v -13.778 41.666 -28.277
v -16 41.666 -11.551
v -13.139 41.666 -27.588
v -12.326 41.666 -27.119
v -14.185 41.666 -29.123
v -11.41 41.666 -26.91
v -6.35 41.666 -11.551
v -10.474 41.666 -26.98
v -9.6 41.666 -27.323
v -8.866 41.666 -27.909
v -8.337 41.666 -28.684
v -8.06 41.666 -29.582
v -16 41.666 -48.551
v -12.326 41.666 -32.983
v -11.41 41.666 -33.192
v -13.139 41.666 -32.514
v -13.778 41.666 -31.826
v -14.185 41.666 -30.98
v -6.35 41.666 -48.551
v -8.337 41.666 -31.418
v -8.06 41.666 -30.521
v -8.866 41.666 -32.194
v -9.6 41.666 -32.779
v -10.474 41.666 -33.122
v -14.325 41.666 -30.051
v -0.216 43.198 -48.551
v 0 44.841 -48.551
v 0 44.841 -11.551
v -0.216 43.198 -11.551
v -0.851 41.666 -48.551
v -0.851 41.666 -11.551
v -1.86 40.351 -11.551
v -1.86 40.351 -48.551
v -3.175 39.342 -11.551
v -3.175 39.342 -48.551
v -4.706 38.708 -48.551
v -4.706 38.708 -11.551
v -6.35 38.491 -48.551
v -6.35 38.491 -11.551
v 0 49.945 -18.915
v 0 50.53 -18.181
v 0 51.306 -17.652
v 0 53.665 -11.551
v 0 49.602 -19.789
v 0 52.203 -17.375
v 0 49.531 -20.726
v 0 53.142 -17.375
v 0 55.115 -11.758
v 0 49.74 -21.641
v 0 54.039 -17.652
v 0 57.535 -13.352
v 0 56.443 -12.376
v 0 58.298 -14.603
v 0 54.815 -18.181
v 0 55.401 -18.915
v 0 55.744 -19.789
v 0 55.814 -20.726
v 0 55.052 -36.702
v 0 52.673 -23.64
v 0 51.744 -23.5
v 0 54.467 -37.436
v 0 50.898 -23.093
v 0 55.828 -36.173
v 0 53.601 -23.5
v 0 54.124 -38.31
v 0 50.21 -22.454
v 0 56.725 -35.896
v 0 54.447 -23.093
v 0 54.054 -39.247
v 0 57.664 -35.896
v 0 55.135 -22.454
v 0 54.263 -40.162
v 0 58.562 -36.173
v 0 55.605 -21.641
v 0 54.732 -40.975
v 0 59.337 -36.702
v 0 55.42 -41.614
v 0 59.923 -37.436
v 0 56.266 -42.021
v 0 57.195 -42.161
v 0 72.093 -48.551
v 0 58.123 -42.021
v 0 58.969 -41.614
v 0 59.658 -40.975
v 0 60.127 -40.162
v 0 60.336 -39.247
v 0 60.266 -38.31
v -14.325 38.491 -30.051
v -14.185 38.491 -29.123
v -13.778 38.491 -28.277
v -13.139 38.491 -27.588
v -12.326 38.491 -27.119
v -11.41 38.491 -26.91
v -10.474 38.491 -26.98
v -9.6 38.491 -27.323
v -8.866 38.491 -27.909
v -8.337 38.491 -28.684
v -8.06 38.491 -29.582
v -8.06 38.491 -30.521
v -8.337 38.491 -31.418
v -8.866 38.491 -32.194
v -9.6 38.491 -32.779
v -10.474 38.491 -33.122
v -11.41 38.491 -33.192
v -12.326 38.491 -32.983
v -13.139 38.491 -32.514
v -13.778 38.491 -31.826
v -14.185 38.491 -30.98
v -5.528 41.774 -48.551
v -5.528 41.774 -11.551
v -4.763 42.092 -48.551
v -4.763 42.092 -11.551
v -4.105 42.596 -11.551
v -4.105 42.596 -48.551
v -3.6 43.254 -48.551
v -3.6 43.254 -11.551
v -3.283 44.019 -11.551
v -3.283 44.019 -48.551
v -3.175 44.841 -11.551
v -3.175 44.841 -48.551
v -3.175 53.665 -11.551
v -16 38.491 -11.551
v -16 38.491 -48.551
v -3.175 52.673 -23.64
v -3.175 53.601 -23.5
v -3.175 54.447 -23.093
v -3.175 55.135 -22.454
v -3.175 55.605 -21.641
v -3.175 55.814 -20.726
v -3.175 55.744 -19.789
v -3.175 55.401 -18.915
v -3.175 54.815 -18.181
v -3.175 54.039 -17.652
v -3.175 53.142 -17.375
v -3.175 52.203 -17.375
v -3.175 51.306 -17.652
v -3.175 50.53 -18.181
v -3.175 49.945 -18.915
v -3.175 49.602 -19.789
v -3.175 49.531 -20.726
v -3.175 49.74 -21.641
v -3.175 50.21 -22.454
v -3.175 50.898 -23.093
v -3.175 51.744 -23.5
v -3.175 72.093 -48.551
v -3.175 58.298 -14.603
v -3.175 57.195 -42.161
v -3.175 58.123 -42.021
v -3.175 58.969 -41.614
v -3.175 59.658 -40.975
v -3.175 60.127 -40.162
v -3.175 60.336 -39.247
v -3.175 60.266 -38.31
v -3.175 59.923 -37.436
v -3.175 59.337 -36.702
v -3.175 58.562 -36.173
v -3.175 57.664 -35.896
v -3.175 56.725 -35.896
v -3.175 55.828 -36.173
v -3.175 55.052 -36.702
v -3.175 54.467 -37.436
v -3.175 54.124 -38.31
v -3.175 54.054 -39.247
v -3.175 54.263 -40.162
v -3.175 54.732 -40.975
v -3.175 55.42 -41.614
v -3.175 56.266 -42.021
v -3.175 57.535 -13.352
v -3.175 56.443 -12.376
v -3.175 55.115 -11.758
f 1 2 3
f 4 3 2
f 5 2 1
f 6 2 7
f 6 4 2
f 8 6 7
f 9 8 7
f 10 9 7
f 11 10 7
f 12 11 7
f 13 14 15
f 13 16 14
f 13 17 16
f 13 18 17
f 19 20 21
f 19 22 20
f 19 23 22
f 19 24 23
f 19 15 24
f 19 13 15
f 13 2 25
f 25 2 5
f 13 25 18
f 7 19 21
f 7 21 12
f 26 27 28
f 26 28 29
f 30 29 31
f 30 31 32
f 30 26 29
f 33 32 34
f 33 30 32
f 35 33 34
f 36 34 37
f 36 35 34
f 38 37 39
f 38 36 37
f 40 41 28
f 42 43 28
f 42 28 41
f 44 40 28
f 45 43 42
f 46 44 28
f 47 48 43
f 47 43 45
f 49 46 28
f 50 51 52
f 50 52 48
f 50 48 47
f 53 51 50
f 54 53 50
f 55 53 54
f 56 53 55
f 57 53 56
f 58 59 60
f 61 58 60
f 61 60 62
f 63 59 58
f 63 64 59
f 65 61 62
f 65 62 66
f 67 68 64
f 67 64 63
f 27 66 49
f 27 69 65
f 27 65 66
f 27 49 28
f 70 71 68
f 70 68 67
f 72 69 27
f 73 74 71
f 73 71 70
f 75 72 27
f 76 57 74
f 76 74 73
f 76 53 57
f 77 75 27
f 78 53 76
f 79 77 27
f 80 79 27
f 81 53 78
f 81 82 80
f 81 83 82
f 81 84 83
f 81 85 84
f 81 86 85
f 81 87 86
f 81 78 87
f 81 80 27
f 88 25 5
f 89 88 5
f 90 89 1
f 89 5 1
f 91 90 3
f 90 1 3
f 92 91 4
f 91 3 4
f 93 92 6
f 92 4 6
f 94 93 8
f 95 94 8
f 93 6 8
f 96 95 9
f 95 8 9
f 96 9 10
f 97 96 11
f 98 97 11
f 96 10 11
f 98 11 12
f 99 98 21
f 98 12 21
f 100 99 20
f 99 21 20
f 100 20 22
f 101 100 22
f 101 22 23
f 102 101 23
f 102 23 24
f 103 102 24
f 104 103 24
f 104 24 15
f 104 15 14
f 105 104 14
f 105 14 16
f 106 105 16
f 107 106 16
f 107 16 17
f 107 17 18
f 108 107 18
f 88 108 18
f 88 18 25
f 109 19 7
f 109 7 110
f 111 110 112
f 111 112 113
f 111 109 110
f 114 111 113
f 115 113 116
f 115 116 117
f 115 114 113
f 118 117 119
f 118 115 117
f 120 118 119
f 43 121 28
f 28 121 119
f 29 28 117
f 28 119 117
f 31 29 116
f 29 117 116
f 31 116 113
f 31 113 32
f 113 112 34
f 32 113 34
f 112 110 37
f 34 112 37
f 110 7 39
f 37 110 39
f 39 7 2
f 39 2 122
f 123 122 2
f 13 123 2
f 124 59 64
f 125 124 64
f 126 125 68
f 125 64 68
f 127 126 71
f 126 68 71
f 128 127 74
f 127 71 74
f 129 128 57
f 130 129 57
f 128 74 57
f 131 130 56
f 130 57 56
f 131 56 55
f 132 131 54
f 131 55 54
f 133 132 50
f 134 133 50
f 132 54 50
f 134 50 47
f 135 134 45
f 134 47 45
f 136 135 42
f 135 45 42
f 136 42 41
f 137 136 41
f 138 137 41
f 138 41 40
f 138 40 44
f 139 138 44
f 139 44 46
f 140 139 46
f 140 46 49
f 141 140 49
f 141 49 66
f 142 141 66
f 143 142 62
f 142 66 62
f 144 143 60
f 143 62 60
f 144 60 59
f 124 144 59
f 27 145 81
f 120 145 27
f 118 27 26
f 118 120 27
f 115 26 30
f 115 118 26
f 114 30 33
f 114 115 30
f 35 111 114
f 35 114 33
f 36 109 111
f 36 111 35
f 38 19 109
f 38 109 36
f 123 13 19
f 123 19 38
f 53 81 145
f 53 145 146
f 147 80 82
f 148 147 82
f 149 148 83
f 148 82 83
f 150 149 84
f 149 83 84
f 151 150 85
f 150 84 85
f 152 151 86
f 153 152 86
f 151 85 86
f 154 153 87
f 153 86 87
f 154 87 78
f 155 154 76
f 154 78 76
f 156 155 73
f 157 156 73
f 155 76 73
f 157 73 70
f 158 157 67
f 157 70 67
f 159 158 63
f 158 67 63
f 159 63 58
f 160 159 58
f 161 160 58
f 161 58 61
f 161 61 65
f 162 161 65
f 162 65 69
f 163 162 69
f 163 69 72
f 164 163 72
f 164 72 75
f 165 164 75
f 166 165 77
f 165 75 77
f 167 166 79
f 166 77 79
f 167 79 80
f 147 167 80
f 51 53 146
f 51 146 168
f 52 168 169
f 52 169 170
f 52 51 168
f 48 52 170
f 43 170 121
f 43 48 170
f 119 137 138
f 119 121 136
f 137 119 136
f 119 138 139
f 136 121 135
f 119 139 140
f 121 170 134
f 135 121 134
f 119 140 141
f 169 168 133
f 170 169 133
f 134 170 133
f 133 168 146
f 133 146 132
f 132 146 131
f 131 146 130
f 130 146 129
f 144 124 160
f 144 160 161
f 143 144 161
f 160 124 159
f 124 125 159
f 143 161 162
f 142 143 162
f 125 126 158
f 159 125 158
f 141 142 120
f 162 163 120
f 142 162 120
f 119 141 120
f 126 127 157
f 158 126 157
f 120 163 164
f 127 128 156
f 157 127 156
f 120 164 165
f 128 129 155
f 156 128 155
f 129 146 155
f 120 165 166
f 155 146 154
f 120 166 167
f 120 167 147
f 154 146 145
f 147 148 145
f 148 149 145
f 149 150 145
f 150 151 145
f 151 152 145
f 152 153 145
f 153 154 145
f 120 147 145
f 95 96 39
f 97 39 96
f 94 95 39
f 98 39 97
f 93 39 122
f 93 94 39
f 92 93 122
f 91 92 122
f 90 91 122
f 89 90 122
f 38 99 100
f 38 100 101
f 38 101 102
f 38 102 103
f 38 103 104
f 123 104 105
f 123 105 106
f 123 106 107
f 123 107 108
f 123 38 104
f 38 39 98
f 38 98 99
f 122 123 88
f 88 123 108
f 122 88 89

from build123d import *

# Parameters (mm, degrees)
SKETCH2_R                    = 3.15
BASE_FLANGE1_DEPTH           = 3.175
EDGE_FLANGE1_STRIP_W         = 20.85
EDGE_FLANGE1_STRIP_H         = 3.175
EDGE_FLANGE1_STRIP_CUT_DEPTH = 37
EDGE_FLANGE1_DEPTH           = 37
SKETCH10_R                   = 3.15
CUT_EXTRUDE1_DEPTH           = 10


# Sheet-metal steps are written as plain solids
with BuildPart() as part:
    # Sketch2 → Base-Flange1 (new body)
    with BuildSketch(Plane(origin=(0, 0, 0), x_dir=(0, 0, -1), z_dir=(1, 0, 0))):
        with BuildLine():
            Line((48.551064785, 40.291218586), (48.551064785, 72.093066751))
            Line((48.551064785, 72.093066751), (14.602650648, 58.297559694))
            ThreePointArc((14.602650648, 58.297559694), (12.37556545, 56.443388888), (11.551064785, 53.665249851))
            Line((11.551064785, 53.665249851), (11.551064785, 40.291218586))
            Line((11.551064785, 40.291218586), (48.551064785, 40.291218586))
        make_face()
        with Locations((39.011220588, 57.194773579)):
            Circle(SKETCH2_R, mode=Mode.SUBTRACT)
        with Locations((20.490203266, 52.672523101)):
            Circle(SKETCH2_R, mode=Mode.SUBTRACT)
    extrude(amount=-BASE_FLANGE1_DEPTH)

    # Edge-Flange1 strip (across the edge) → Edge-Flange1 strip cut (cut)
    with BuildSketch(Plane(origin=(-3.175, 38.491218586, -48.551064785), x_dir=(0, 1, 0), z_dir=(0, 0, 1))):
        with Locations((-4.075, -1.5875)):
            Rectangle(EDGE_FLANGE1_STRIP_W, EDGE_FLANGE1_STRIP_H)
    extrude(amount=EDGE_FLANGE1_STRIP_CUT_DEPTH, mode=Mode.SUBTRACT)

    # Edge-Flange1 section (across the edge) → Edge-Flange1 (add)
    with BuildSketch(Plane(origin=(-3.175, 38.491218586, -48.551064785), x_dir=(0, 1, 0), z_dir=(0, 0, 1))):
        with BuildLine():
            Line((0, 3.175), (0, 12.825))
            Line((0, 12.825), (3.175, 12.825))
            Line((3.175, 12.825), (3.175, 3.175))
            ThreePointArc((3.175, 3.175), (4.10493597, 0.92993597), (6.35, 0))
            Line((6.35, 0), (6.35, -3.175))
            ThreePointArc((6.35, -3.175), (1.859871939, -1.315128061), (0, 3.175))
        make_face()
    extrude(amount=EDGE_FLANGE1_DEPTH)

    # Sketch10 → Cut-Extrude1 (cut)
    with BuildSketch(Plane(origin=(0, 41.666218586, 0), x_dir=(1, 0, 0), z_dir=(0, 1, 0))):
        with Locations(Location((-11.175, 30.051064785, 0), (0, 0, 180))):
            Circle(SKETCH10_R)
    extrude(amount=-CUT_EXTRUDE1_DEPTH, mode=Mode.SUBTRACT)


solid = part.part
